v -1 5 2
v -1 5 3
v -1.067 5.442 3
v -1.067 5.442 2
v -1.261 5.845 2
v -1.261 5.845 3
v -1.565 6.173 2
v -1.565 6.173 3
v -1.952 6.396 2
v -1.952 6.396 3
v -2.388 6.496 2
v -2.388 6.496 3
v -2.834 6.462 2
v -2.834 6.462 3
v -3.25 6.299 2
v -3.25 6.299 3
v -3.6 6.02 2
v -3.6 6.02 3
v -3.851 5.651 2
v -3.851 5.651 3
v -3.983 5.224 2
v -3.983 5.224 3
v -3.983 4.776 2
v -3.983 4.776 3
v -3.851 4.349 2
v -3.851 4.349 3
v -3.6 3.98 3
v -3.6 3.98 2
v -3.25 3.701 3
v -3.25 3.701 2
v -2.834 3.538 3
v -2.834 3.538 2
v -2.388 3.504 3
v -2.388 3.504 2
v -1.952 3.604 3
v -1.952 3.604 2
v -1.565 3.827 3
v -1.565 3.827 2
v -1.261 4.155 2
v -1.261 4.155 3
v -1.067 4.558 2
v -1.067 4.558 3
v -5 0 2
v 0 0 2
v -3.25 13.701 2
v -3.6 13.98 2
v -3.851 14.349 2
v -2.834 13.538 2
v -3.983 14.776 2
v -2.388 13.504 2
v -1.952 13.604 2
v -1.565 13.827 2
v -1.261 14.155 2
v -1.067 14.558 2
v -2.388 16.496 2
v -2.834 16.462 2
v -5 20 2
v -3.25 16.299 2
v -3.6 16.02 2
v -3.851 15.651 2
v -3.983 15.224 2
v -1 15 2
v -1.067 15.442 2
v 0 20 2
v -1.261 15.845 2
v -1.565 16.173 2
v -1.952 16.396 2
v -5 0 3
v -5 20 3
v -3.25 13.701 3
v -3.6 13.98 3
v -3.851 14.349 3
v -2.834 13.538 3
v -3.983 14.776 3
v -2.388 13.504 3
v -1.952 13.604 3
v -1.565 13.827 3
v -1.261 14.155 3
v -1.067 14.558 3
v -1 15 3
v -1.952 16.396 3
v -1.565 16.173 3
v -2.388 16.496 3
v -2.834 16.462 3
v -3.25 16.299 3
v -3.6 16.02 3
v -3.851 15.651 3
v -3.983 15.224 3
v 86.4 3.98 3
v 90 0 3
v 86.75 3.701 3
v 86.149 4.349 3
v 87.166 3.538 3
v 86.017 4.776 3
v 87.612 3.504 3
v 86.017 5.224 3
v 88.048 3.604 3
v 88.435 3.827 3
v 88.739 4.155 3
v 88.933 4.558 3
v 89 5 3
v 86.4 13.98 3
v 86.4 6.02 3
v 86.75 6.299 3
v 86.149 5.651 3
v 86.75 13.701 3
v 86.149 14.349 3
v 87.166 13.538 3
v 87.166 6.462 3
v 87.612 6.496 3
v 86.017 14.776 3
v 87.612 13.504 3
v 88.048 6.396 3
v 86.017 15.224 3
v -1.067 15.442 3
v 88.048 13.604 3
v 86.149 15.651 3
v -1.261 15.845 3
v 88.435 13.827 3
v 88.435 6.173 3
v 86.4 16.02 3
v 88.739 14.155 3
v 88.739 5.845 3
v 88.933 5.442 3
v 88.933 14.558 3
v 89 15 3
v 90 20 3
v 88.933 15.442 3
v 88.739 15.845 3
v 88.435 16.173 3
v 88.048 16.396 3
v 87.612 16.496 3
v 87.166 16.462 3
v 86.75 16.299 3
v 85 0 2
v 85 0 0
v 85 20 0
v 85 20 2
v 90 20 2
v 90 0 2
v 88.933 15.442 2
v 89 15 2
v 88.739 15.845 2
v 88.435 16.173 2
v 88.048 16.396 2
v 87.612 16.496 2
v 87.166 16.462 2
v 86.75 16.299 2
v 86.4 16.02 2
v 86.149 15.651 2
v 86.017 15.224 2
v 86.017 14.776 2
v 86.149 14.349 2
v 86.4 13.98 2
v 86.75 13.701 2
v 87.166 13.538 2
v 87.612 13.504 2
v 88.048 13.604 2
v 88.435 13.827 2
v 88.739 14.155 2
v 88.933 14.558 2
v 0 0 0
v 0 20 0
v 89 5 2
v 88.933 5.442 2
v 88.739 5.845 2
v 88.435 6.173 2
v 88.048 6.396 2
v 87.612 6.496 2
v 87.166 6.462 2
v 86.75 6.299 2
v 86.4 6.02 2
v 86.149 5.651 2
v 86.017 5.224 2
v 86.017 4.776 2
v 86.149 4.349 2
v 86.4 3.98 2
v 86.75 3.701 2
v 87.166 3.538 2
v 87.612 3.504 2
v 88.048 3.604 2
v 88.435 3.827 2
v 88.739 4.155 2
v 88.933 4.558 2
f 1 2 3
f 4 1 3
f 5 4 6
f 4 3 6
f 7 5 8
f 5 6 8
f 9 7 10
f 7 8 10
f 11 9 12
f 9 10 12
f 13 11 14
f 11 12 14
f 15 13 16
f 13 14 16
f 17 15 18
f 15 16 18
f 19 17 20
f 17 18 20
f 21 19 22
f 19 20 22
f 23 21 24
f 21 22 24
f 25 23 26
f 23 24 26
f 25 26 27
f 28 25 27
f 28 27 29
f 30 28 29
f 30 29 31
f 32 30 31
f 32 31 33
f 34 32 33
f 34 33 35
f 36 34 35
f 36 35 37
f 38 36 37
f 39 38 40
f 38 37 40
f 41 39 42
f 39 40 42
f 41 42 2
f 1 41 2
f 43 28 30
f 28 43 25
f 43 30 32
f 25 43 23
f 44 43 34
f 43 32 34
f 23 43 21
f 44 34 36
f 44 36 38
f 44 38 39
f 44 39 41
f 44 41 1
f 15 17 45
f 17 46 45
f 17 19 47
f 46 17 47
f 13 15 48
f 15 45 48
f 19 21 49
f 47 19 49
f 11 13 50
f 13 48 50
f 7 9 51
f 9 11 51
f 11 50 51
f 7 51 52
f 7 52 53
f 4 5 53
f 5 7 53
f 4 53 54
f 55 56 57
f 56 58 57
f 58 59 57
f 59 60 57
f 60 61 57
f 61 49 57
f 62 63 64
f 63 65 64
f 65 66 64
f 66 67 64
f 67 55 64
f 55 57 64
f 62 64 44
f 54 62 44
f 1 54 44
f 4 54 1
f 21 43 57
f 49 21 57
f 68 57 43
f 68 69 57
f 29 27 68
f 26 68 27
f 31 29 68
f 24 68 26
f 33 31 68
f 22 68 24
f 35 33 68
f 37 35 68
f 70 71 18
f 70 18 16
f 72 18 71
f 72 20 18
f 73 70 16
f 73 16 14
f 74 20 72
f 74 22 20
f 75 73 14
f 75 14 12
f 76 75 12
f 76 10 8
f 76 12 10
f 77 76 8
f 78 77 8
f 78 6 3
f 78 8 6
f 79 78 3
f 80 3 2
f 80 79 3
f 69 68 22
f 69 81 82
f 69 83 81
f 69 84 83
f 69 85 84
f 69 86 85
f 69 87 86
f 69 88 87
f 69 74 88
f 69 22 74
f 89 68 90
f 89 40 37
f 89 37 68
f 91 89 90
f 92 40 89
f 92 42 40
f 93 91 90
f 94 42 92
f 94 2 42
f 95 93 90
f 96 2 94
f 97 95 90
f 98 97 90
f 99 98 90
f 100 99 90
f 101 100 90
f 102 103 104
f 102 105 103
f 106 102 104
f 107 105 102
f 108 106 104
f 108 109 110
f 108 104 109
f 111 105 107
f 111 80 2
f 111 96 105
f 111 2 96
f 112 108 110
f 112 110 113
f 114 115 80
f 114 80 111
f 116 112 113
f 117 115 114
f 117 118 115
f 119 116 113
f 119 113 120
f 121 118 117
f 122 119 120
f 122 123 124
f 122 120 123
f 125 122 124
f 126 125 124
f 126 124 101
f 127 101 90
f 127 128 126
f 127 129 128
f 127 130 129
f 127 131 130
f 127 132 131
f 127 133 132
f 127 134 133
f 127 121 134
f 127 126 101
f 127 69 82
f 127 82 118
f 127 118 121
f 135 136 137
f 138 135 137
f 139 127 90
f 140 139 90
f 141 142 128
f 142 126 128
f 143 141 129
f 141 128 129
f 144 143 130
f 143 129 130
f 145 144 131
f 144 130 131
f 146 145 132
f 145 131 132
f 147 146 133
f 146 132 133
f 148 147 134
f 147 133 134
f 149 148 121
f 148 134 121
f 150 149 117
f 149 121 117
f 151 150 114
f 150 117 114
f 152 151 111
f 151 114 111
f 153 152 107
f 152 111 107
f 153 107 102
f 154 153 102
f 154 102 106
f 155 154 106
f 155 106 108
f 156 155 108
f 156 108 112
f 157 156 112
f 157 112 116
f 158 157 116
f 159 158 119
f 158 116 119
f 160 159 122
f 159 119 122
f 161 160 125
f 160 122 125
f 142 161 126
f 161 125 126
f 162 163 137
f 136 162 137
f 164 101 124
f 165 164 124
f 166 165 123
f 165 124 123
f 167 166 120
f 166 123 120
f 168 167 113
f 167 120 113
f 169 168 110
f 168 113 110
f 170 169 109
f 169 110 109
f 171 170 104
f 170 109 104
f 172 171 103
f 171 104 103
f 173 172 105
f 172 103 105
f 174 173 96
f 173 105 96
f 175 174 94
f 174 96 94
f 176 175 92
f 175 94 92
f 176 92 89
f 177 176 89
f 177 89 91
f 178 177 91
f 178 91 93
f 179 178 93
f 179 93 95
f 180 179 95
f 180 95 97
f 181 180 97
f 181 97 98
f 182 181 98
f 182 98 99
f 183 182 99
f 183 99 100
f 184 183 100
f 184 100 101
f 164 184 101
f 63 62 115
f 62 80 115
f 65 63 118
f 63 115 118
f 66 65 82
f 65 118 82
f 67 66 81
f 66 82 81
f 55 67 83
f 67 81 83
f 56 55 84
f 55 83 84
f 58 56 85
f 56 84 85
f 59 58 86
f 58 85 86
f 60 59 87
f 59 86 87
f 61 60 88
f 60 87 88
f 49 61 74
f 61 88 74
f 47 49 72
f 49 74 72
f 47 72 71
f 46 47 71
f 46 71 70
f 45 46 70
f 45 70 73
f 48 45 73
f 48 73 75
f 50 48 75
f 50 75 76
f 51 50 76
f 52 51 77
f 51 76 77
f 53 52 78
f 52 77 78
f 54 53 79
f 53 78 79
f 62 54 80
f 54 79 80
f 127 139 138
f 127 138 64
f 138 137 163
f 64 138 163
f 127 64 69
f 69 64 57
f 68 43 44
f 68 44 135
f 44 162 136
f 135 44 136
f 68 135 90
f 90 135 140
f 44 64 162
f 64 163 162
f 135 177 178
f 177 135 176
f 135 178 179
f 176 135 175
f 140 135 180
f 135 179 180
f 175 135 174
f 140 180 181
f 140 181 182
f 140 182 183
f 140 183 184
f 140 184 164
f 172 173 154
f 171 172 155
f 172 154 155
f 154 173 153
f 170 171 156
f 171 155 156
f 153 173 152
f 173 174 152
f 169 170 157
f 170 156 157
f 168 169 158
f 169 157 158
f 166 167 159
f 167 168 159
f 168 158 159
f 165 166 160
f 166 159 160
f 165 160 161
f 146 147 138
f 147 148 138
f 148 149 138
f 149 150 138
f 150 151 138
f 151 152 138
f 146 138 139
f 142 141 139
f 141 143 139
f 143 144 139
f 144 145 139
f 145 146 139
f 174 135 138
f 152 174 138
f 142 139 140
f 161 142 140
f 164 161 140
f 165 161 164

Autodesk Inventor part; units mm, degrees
ref_plane "YZ Plane" through (0, 0, 0) normal (1, 0, 0) x (0, 1, 0)
ref_plane "XZ Plane" through (0, 0, 0) normal (0, 1, 0) x (-1, 0, 0)
ref_plane "XY Plane" through (0, 0, 0) normal (0, 0, 1) x (1, 0, 0)
sketch "Эскиз1" plane through (0, 0, 0) normal (0, 0, 1) x (1, 0, 0)
  point P0 (0, 0)
sketch "Эскиз2" plane through (0, 0, 0) normal (0, 0, 1) x (1, 0, 0)
  line L0 (0, 0) -> (85, 0)
  line L1 (85, 0) -> (85, 20)
  line L2 (85, 20) -> (0, 20)
  line L3 (0, 20) -> (0, 0)
  dimension "d0" = 85
  dimension "d1" = 20
extrude "Выдавливание1" add sketch "Эскиз2" along normal blind 3
sketch "Эскиз3" plane through (0, 0, 3) normal (0, 0, 1) x (1, 0, 0)
  line L0 (0, 20) -> (0, 0) projected
  line L1 (85, 0) -> (85, 20) projected
  line L2 (0, 20) -> (-5, 20)
  line L3 (-5, 20) -> (-5, 0)
  line L4 (-5, 0) -> (0, 0)
  line L5 (0, 0) -> (0, 20)
  circle A0 centre (-2.5, 15) radius 1.5
  circle A1 centre (-2.5, 5) radius 1.5
  line L6 (85, 20) -> (85, 0)
  line L7 (85, 20) -> (90, 20)
  line L8 (90, 20) -> (90, 0)
  line L9 (90, 0) -> (85, 0)
  line L10 (85, 0) -> (85, 20)
  circle A2 centre (87.5, 15) radius 1.5
  circle A3 centre (87.5, 5) radius 1.5
  dimension "d4" = 5
  dimension "d7" = 3
  dimension "d8" = 3
extrude "Выдавливание2" add sketch "Эскиз3" against normal blind 1
properties part number "Крышка на ESC" material "Пластик ПЭТ"
